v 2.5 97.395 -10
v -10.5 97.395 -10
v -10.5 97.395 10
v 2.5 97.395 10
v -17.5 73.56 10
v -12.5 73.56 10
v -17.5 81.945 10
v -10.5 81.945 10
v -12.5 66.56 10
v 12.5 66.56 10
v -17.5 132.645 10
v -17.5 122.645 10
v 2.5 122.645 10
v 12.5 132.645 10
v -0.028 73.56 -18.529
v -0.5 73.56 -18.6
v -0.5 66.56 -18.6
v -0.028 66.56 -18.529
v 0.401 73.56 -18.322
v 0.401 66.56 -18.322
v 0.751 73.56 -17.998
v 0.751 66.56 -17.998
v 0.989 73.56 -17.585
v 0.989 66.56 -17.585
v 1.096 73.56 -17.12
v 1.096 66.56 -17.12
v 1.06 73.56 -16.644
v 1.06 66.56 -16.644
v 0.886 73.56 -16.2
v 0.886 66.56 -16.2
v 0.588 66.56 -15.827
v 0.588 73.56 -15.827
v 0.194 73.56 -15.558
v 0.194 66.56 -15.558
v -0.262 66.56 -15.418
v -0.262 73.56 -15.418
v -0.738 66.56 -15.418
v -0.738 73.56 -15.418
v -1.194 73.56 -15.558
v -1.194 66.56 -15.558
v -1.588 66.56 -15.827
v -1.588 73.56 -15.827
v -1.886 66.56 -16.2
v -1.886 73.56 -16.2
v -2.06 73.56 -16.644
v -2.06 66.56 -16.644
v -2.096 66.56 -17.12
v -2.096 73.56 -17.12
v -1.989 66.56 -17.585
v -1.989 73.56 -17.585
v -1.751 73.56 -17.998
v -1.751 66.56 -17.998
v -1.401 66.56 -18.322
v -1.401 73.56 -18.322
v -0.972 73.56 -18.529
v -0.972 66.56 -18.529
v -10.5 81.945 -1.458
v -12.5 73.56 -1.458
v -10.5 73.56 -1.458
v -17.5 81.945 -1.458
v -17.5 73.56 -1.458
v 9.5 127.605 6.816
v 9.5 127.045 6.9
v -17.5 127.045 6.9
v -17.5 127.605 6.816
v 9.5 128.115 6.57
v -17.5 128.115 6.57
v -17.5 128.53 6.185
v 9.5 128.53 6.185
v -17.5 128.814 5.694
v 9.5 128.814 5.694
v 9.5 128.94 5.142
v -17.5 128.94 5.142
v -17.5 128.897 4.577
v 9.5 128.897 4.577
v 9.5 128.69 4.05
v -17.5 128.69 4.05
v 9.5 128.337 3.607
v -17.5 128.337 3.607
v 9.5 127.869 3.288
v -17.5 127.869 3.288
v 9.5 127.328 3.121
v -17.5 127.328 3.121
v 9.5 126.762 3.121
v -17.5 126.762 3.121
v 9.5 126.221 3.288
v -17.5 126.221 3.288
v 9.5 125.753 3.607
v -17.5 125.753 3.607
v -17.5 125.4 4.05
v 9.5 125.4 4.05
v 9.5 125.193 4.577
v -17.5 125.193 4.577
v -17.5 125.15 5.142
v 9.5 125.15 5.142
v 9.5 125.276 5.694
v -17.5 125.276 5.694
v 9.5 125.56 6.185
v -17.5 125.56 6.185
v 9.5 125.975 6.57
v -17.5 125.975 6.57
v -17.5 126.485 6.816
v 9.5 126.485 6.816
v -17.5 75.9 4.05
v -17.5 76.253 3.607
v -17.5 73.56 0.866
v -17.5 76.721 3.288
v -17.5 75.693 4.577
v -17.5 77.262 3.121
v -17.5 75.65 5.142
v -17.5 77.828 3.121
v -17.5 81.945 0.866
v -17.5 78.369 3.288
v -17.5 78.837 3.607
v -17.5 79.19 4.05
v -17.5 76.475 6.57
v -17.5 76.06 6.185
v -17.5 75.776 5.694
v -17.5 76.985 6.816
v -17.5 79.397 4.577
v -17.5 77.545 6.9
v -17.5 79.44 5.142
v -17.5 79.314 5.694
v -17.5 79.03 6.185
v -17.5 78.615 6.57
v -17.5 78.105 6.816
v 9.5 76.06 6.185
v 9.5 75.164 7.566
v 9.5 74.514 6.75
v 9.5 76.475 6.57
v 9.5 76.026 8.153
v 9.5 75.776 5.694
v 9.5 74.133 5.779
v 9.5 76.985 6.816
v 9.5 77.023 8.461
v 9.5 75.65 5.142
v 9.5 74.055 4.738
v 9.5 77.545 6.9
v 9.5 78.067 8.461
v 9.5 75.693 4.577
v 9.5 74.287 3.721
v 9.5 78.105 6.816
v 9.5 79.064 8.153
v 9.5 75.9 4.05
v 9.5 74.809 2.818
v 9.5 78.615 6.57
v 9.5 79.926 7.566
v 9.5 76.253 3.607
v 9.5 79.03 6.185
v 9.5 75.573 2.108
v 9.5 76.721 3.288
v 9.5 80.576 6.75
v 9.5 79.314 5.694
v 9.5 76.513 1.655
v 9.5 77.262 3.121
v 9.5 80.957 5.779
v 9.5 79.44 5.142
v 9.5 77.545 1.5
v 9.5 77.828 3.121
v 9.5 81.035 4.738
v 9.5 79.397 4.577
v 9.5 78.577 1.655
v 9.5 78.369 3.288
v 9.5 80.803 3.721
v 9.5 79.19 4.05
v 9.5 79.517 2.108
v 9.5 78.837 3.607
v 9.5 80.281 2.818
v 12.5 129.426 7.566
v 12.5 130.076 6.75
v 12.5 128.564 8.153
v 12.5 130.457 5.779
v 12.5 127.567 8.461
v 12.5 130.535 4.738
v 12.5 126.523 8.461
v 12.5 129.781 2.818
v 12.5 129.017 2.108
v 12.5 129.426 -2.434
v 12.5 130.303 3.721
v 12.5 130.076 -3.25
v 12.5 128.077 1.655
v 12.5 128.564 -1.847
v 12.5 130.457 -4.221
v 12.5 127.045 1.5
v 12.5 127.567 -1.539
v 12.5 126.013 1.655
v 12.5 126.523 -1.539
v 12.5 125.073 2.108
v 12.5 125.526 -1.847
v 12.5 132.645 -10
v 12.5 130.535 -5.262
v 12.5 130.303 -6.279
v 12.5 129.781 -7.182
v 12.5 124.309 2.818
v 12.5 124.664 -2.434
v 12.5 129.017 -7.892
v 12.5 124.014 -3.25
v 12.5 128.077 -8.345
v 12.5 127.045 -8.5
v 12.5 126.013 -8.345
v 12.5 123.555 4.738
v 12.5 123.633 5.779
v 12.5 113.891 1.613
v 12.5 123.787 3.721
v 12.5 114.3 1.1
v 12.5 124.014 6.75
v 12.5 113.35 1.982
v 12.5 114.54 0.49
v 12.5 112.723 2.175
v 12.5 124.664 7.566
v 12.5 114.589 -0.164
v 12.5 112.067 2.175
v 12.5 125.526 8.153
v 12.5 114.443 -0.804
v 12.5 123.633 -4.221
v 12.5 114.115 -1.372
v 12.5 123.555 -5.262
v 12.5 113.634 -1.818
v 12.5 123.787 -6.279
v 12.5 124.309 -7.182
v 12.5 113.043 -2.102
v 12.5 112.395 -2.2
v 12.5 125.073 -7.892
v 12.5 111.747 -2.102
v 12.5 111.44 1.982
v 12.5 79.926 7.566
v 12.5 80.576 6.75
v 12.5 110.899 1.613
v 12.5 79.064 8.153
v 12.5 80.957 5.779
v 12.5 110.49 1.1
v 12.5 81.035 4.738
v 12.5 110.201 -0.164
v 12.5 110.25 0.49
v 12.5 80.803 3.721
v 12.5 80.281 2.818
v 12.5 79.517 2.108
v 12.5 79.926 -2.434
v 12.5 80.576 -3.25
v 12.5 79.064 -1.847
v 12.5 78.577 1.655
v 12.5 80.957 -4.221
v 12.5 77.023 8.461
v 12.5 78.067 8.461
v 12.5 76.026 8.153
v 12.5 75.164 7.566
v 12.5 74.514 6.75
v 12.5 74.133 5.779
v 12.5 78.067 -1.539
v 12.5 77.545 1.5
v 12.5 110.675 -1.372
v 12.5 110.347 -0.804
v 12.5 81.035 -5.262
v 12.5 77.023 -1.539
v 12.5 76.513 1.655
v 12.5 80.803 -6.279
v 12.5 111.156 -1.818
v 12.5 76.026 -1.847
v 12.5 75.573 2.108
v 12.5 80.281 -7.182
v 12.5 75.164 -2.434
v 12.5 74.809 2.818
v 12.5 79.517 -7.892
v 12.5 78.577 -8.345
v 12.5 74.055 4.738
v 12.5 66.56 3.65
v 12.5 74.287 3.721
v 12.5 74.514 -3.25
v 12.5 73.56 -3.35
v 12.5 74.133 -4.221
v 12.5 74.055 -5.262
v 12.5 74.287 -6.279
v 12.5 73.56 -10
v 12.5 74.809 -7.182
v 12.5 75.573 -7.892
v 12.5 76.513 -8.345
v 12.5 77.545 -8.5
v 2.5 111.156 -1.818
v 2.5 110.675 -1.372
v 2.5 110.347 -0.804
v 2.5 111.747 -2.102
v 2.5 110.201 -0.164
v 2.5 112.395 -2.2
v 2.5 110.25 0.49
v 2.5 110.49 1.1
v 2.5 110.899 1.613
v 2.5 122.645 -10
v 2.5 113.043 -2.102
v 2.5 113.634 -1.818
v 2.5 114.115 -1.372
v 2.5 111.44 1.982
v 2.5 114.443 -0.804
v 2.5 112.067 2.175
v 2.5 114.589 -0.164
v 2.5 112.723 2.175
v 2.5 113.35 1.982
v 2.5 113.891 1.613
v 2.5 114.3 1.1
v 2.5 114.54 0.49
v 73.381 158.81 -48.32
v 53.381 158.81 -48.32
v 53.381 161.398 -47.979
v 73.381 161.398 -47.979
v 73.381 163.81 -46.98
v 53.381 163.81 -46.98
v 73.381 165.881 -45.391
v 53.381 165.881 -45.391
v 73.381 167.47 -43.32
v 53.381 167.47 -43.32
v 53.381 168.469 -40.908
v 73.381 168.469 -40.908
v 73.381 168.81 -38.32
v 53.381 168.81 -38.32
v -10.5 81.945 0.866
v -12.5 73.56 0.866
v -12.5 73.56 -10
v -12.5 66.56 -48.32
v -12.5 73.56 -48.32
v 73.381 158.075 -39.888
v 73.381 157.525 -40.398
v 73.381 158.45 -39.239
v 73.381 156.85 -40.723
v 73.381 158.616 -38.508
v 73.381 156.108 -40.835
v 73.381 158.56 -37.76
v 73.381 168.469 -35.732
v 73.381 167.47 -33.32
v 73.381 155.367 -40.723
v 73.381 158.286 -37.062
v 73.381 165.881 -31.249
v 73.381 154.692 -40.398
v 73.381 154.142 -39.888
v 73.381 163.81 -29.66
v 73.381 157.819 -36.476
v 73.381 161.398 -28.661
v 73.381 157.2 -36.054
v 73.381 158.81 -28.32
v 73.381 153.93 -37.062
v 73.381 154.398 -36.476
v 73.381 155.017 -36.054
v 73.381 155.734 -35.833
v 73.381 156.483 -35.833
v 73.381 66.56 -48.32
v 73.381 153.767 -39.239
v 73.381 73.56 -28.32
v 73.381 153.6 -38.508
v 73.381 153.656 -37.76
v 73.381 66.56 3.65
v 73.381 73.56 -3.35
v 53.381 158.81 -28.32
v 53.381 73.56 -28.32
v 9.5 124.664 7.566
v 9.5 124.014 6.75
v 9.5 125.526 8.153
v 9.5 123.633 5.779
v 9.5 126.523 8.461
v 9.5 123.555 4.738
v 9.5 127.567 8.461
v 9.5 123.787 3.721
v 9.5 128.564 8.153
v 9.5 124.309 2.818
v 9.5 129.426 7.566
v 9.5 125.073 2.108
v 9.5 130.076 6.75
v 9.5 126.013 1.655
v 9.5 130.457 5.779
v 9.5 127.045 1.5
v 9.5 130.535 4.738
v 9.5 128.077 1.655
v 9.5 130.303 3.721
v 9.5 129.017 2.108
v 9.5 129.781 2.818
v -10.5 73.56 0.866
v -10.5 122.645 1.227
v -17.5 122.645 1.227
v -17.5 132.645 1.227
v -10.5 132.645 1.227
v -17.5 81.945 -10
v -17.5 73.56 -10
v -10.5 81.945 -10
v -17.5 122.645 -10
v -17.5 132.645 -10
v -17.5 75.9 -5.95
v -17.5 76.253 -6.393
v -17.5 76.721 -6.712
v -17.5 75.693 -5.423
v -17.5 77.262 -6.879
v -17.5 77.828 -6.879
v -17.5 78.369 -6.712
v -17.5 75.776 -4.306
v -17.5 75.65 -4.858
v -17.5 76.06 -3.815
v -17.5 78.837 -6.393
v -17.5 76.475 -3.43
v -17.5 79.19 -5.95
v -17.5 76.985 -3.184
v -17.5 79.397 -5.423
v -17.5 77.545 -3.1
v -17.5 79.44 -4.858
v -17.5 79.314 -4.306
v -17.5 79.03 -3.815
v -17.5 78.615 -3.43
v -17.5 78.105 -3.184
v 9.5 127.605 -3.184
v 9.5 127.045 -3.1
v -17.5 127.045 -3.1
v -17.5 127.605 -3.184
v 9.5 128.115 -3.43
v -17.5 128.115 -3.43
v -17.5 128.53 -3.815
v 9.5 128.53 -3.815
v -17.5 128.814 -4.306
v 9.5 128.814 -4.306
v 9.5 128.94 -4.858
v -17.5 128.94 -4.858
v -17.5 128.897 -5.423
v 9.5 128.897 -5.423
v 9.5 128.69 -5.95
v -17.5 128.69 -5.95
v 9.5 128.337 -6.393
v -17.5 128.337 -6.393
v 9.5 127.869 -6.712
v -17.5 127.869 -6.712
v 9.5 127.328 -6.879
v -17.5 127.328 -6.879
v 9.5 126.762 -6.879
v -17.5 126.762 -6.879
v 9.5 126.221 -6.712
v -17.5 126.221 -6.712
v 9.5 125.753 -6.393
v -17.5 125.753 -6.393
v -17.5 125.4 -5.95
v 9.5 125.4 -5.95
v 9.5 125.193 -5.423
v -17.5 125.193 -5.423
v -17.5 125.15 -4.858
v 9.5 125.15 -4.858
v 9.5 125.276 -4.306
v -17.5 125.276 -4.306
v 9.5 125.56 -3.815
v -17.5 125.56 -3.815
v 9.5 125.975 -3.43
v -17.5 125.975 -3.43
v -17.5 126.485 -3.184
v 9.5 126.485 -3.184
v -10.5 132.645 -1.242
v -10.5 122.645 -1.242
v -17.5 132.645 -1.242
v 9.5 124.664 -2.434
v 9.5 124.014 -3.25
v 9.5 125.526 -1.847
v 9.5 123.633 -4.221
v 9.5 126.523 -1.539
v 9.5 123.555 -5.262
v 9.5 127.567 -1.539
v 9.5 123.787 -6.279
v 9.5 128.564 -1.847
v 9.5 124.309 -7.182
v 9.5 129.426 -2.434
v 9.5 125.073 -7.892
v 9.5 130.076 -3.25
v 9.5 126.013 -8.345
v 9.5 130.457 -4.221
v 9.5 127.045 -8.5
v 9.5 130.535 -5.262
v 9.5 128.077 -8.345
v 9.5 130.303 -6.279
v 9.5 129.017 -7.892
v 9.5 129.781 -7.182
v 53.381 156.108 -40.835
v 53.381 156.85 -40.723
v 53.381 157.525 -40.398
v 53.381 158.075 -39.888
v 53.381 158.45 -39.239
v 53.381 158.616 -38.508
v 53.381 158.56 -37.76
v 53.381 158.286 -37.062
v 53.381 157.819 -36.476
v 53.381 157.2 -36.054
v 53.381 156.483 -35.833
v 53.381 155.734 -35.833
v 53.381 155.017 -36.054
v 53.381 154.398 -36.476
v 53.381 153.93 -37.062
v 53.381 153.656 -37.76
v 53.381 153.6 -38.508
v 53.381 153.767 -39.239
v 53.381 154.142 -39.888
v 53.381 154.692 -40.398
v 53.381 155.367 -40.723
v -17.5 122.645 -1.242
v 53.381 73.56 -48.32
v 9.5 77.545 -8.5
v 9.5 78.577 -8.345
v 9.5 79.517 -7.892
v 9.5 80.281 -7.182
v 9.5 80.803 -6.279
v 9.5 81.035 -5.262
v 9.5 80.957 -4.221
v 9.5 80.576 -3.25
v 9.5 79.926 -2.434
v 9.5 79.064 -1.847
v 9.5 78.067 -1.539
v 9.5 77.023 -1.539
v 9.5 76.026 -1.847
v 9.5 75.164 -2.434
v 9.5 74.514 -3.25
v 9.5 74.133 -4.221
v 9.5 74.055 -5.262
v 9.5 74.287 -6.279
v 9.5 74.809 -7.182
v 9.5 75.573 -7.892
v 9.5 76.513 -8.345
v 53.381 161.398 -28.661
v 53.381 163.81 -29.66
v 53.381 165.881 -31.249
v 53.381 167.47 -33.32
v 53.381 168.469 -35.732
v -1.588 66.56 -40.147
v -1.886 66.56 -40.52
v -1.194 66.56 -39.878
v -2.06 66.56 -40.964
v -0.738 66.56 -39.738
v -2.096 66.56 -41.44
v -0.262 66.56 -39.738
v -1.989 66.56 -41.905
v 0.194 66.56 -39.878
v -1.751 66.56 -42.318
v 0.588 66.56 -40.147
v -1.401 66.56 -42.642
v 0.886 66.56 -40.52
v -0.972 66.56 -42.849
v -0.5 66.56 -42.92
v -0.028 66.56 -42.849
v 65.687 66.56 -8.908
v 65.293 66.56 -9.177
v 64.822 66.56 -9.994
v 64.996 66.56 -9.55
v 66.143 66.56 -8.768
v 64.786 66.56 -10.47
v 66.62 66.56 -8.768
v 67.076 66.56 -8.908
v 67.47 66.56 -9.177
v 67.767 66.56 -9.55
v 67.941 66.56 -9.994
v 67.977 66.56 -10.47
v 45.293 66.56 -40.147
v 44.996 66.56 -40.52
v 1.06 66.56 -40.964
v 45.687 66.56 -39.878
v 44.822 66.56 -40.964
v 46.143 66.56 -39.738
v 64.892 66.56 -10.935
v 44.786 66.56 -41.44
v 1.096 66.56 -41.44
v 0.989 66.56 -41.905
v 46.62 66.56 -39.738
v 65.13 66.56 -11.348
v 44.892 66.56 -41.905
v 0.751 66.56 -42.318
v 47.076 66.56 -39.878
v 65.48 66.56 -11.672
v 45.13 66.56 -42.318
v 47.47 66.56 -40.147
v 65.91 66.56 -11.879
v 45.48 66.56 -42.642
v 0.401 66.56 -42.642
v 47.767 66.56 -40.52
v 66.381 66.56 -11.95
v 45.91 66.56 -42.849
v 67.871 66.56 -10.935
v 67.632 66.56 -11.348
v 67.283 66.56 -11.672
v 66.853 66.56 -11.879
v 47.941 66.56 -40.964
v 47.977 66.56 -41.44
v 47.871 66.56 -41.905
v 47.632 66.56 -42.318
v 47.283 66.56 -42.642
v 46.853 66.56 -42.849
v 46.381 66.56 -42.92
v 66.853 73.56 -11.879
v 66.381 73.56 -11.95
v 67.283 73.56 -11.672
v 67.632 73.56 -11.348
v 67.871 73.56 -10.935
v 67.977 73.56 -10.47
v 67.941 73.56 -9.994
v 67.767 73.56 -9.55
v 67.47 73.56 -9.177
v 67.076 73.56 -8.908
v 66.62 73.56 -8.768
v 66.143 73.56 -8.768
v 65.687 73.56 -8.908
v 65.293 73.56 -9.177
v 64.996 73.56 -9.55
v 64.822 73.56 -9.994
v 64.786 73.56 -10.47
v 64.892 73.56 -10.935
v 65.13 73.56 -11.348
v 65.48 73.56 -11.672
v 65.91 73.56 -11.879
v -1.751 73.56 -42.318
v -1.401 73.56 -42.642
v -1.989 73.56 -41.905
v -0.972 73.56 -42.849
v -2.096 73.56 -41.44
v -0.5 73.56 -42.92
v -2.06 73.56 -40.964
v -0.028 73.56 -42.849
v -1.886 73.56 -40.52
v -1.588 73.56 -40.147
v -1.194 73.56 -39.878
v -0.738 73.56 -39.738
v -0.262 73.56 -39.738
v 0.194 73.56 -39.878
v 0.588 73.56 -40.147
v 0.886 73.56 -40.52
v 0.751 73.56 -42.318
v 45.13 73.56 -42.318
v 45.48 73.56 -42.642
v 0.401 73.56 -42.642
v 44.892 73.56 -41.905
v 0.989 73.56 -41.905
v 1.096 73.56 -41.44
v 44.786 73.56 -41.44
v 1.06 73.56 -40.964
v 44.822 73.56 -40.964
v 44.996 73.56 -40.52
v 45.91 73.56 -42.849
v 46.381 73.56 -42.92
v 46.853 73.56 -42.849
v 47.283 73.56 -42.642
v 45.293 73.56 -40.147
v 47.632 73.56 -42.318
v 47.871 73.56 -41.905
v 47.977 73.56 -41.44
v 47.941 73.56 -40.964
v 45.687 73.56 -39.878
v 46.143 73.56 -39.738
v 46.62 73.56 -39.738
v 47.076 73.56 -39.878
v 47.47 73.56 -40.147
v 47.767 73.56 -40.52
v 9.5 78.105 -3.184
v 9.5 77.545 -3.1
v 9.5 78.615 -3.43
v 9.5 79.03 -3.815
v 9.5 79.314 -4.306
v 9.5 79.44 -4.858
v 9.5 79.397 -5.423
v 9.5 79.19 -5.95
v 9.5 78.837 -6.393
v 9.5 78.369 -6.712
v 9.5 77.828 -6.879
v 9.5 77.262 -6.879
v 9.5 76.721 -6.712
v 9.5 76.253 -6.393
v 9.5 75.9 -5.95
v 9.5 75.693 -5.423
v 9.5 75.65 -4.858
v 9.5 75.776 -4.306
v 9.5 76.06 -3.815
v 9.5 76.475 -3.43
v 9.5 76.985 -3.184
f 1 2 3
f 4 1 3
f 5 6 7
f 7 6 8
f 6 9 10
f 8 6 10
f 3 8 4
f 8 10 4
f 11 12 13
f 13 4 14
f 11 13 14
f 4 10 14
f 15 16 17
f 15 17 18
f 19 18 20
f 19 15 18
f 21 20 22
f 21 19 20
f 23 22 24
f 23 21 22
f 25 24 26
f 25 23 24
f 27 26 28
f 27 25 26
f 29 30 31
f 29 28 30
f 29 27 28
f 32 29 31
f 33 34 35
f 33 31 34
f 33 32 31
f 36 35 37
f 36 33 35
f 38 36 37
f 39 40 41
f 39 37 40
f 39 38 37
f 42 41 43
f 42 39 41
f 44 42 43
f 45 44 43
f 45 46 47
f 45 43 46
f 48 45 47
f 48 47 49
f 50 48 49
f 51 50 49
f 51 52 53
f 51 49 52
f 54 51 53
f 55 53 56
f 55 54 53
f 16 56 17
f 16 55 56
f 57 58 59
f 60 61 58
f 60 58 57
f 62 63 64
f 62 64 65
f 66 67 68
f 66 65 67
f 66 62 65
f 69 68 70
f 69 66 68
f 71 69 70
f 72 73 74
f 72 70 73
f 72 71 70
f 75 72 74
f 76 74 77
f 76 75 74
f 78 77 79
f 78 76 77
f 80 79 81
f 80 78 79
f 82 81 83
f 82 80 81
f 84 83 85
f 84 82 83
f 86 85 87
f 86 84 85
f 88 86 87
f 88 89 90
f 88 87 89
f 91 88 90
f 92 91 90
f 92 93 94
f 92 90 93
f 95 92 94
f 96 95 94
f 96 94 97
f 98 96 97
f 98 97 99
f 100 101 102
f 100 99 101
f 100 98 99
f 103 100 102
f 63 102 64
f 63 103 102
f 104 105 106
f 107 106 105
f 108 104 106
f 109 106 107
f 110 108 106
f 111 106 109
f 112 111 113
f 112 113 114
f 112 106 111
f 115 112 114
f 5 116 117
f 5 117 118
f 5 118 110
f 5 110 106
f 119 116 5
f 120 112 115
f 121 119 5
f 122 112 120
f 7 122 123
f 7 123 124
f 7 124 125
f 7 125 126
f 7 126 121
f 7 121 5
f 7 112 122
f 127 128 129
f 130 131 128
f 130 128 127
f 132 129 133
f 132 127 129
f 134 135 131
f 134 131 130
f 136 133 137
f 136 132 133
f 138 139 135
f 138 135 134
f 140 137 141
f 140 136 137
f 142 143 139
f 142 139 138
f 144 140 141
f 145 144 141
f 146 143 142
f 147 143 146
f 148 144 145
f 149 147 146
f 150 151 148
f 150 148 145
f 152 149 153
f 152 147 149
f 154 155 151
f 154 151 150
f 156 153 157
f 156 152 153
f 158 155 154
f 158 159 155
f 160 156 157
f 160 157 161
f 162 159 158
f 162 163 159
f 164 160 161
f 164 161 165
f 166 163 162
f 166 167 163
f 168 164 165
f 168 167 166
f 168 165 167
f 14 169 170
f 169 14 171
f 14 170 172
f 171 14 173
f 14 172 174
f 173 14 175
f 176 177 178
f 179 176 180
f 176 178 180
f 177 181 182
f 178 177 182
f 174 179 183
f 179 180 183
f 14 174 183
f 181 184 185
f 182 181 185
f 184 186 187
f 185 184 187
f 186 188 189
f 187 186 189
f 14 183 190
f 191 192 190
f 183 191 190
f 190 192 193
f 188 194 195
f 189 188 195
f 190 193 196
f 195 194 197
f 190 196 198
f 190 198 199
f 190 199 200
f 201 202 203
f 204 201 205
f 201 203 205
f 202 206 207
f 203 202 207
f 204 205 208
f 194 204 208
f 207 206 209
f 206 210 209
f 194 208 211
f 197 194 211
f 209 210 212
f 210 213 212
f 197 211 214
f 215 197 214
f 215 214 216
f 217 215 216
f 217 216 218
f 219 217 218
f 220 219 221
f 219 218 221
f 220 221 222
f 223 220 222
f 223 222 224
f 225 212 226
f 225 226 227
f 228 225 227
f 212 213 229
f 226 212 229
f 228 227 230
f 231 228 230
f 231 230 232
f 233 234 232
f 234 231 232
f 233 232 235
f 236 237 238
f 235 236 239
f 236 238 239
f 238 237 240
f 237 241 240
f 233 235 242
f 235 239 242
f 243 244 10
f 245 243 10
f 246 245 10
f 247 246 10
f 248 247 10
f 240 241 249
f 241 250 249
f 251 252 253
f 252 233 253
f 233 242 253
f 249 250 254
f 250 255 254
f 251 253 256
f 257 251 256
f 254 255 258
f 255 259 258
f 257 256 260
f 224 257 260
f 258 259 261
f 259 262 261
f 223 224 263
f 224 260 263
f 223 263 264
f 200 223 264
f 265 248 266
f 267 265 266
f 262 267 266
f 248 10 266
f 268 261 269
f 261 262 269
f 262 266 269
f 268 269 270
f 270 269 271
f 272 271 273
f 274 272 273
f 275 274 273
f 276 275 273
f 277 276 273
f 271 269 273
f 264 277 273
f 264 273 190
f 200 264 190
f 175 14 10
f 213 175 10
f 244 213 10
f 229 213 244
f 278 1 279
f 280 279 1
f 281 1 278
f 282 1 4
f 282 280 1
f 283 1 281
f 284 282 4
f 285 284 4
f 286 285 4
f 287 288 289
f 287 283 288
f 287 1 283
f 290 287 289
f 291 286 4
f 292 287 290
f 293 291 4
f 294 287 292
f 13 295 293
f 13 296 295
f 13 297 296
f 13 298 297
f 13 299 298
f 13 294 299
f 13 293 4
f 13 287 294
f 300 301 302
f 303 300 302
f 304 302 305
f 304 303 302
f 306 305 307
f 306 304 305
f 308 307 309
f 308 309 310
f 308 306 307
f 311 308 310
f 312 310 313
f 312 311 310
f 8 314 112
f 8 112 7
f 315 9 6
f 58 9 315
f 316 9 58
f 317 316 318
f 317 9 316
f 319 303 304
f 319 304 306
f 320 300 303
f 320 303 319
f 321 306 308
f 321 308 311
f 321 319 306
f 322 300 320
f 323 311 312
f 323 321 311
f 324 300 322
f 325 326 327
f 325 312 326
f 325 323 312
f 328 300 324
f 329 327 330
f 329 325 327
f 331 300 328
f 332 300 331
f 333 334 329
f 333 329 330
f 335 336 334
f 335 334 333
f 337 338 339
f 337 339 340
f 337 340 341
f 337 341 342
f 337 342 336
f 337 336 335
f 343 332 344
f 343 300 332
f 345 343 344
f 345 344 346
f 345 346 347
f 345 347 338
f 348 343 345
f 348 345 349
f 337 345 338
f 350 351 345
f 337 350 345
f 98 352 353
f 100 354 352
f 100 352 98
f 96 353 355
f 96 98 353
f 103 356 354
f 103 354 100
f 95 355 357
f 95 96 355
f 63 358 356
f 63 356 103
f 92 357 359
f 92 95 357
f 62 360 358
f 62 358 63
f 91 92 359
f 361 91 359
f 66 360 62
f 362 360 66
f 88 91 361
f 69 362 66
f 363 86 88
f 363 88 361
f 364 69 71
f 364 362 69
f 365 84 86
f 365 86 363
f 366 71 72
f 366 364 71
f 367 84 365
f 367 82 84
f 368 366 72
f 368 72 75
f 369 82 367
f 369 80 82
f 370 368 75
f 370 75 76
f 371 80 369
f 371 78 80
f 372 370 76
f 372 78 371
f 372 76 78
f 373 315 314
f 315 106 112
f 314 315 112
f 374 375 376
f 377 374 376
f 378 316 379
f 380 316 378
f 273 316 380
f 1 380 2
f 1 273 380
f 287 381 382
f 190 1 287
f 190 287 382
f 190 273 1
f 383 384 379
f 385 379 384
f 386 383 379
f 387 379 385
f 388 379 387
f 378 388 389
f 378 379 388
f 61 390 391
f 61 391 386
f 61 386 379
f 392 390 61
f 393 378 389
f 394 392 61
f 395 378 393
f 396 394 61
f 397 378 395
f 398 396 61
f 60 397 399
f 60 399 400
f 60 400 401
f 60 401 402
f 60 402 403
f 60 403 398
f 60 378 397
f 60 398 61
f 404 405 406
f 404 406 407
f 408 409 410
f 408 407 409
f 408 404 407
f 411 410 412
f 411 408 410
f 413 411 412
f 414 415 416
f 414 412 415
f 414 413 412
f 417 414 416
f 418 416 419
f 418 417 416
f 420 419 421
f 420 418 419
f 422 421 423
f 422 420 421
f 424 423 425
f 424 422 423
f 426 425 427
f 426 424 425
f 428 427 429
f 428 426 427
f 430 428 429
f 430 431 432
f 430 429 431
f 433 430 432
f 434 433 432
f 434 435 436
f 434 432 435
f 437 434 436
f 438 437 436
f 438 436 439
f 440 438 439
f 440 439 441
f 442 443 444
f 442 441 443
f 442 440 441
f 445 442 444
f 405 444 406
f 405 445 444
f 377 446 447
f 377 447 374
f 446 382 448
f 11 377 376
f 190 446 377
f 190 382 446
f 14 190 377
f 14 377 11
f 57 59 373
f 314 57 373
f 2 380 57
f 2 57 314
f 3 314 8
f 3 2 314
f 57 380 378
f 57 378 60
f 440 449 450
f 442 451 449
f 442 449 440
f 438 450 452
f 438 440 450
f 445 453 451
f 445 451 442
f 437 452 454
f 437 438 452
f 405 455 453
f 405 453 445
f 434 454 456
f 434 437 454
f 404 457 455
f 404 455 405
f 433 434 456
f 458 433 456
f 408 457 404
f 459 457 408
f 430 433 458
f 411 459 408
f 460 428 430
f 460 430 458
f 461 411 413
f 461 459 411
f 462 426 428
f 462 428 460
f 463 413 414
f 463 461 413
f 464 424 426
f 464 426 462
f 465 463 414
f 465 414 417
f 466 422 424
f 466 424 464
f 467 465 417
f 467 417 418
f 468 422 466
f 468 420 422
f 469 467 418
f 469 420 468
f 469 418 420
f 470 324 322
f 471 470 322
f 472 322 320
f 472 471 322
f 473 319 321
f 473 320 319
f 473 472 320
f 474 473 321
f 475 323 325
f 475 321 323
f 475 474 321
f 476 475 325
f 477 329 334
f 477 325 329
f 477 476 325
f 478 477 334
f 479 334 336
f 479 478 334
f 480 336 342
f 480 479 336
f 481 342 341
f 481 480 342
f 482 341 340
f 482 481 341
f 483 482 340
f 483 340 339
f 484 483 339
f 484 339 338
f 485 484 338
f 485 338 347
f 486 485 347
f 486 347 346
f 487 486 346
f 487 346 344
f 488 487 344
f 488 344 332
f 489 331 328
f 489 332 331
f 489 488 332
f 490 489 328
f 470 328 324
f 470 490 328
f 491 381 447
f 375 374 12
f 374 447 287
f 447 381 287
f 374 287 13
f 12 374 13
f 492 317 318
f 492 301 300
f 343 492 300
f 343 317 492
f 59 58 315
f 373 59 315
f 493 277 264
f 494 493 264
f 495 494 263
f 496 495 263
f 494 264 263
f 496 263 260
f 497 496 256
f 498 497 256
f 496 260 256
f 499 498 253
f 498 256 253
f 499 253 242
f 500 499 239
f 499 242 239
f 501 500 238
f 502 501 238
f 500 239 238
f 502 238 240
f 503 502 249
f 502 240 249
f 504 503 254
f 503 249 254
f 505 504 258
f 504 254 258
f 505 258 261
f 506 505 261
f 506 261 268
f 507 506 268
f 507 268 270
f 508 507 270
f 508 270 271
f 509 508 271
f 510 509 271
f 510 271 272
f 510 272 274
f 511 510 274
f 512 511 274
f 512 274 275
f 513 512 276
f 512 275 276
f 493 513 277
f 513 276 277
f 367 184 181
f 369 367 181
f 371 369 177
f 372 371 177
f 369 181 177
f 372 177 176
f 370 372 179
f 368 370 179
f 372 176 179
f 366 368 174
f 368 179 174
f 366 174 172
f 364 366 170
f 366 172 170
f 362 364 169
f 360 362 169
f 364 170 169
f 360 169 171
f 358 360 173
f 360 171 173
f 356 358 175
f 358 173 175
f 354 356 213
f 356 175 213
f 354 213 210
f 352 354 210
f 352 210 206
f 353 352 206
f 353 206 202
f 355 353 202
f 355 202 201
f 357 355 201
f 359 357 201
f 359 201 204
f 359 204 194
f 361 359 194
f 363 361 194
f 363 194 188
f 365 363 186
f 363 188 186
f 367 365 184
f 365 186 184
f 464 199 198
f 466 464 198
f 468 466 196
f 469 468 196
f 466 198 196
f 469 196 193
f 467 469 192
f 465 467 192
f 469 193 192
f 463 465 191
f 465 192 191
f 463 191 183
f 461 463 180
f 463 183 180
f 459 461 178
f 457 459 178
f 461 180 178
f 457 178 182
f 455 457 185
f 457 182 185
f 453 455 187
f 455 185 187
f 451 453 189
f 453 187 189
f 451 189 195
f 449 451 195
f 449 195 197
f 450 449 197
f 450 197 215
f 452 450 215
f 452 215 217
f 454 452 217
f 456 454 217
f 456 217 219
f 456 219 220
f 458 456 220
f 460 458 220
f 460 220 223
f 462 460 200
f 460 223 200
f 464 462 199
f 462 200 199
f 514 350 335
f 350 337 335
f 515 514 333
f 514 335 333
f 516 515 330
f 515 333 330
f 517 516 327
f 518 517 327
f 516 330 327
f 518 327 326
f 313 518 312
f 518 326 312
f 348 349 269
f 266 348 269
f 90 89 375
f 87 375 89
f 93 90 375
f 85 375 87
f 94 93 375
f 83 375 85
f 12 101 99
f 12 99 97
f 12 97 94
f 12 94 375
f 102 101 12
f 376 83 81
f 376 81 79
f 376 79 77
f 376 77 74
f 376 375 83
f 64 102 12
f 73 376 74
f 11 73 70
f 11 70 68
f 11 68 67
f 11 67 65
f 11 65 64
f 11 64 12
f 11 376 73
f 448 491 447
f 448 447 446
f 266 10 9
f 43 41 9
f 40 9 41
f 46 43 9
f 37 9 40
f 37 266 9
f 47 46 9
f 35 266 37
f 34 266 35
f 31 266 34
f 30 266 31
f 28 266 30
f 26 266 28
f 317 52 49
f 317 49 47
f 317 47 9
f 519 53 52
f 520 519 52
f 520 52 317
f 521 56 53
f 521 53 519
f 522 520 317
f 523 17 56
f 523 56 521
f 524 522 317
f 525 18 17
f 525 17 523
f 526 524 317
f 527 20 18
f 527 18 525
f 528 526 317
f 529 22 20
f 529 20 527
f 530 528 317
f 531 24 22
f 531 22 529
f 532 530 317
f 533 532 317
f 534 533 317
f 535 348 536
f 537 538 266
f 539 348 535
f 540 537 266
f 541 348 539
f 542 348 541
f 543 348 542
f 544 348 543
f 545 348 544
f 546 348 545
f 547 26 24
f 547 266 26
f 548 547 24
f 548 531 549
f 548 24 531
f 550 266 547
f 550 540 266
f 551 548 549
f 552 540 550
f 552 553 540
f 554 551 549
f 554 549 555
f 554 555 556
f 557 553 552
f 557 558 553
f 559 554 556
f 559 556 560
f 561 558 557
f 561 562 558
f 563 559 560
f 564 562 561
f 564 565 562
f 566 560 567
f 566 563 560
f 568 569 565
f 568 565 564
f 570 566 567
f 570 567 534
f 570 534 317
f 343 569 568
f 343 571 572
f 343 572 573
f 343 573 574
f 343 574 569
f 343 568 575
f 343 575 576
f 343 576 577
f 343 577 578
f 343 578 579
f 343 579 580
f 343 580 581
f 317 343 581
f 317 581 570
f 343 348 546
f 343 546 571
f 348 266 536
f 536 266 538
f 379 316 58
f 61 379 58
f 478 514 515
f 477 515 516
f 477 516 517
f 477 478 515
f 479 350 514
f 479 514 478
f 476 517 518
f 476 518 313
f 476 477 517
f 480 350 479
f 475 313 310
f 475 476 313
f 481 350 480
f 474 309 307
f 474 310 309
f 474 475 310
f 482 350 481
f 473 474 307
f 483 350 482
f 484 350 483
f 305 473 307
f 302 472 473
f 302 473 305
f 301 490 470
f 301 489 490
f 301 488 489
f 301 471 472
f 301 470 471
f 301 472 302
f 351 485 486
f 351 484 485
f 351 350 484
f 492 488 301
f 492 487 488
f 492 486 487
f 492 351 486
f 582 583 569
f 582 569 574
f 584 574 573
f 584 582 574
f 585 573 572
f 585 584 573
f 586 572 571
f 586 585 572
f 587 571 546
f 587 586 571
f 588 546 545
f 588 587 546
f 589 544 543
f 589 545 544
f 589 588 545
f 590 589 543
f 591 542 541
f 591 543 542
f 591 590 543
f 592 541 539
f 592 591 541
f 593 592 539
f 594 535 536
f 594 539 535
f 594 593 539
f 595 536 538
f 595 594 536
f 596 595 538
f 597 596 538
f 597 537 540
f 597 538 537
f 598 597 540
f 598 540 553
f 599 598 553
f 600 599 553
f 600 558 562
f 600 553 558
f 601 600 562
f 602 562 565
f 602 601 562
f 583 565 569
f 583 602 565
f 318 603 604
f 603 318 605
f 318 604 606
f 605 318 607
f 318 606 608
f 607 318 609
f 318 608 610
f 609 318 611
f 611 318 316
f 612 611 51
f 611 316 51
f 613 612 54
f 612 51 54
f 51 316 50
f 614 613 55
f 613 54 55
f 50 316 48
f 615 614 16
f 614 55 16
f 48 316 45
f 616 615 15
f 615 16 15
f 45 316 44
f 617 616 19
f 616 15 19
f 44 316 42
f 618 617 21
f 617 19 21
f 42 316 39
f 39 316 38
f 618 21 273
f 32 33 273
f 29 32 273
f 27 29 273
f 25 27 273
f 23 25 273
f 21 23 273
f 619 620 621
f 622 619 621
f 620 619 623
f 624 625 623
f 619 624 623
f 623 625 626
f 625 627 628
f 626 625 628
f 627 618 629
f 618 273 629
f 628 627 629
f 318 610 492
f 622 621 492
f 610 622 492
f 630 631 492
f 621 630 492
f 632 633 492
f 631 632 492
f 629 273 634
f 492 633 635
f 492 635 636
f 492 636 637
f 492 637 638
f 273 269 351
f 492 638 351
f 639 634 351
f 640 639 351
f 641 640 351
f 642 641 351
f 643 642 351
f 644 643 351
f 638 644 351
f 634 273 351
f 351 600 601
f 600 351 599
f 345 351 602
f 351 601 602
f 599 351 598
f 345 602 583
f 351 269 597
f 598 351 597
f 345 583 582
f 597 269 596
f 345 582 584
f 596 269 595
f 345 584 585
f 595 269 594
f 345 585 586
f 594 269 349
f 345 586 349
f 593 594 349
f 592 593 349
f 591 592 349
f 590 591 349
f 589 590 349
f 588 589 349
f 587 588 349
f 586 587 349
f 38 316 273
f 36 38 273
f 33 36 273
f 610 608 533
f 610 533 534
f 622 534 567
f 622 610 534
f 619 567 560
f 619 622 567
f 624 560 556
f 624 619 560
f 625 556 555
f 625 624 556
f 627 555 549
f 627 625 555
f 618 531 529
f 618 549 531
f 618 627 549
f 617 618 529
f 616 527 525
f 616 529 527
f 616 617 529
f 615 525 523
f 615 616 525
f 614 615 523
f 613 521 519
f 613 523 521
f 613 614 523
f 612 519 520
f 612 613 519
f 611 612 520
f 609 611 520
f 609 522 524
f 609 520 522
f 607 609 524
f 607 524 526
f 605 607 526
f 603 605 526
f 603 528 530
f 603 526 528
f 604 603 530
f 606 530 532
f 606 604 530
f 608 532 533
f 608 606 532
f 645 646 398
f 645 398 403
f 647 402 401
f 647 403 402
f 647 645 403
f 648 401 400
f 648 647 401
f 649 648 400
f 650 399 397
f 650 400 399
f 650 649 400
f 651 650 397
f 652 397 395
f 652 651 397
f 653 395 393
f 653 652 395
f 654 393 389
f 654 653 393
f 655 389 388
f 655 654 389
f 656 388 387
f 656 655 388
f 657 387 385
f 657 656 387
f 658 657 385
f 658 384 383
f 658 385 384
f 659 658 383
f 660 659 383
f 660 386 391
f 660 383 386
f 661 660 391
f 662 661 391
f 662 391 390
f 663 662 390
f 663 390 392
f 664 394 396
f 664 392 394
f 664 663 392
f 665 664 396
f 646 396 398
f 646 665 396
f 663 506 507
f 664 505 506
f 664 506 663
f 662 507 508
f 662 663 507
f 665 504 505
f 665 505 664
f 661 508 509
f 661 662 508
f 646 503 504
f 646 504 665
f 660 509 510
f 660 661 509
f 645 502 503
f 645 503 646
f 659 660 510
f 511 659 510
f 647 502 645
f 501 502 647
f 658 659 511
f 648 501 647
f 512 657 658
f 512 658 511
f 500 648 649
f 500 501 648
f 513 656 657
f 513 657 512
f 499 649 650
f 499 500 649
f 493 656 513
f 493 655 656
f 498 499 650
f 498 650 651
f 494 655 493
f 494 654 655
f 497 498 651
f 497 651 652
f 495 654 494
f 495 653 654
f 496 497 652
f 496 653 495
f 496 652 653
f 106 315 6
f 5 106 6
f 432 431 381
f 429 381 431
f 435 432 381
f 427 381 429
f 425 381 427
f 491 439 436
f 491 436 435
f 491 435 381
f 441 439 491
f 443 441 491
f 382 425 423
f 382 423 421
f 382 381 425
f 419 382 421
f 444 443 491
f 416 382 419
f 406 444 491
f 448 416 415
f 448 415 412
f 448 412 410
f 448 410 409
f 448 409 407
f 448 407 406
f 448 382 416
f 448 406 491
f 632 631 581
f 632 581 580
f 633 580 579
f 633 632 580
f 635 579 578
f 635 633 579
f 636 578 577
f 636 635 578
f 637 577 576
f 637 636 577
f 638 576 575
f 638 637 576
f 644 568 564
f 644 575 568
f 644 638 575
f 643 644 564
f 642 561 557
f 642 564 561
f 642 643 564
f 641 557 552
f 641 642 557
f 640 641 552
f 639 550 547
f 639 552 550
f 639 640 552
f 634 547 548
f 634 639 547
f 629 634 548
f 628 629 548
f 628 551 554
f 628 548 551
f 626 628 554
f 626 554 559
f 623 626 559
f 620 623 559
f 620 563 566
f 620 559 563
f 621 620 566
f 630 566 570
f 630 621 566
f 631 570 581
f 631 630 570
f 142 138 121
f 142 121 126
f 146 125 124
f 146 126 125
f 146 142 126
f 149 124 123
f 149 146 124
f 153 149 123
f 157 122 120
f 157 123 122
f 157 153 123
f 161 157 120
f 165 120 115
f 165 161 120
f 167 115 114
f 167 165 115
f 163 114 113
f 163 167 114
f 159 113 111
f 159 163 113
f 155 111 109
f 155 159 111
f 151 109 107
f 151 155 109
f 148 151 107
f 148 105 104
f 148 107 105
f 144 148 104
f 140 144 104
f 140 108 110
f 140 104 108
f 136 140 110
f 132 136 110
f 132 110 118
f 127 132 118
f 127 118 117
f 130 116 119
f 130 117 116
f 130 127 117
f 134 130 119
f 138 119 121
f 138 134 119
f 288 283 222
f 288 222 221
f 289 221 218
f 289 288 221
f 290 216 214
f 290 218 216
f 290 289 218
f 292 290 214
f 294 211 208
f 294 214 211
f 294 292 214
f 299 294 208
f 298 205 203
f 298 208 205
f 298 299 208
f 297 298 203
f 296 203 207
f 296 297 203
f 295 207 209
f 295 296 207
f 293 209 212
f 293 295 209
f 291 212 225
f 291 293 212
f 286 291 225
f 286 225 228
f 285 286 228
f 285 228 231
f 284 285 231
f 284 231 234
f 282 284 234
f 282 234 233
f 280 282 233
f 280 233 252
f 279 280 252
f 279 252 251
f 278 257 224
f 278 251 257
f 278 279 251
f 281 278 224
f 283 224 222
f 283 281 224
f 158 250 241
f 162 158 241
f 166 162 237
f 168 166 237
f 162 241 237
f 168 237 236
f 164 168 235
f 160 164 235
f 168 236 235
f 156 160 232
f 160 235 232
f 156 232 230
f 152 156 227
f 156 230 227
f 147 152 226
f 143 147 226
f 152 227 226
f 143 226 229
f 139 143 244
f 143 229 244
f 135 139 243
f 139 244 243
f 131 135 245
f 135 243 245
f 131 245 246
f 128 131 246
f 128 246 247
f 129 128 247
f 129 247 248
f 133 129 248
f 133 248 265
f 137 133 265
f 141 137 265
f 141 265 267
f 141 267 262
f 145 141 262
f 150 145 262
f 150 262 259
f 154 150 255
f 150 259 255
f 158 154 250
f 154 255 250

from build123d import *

# Parameters (mm, degrees)
SKETCH1_W                = 25
SKETCH1_H                = 20
BOSS_EXTRUDE1_DEPTH      = 168.81
SKETCH1_W_2              = 20
BOSS_EXTRUDE1_2_DEPTH    = 168.81
CUT_EXTRUDE1_DEPTH       = 194.087721945
CUT_EXTRUDE1_DEPTH_BACK  = 194.087721945
SKETCH2_W                = 25
SKETCH2_H                = 44.708
FILLET2_R                = 10
CUT_EXTRUDE2_DEPTH       = 196.466757701
CUT_EXTRUDE2_DEPTH_BACK  = 196.466757701
SKETCH4_R                = 2.515
CUT_EXTRUDE3_DEPTH       = 186.844513952
CUT_EXTRUDE3_DEPTH_BACK  = 186.844513952
SKETCH3_R                = 2.2
SKETCH5_W                = 58.32
SKETCH5_H                = 66.56
CUT_EXTRUDE4_DEPTH       = 84.405
BOSS_EXTRUDE2_DEPTH      = 7
CHAMFER1_SIZE            = 7
SKETCH8_W                = 20
SKETCH8_H                = 13.858822584
SKETCH8_H_2              = 30.45
CUT_EXTRUDE6_DEPTH       = 2
SKETCH9_W                = 20
SKETCH9_H                = 31.847227872
CUT_EXTRUDE7_DEPTH       = 13
BOSS_EXTRUDE3_START      = -10
SKETCH10_W               = 20
SKETCH10_H               = 10
BOSS_EXTRUDE3_DEPTH      = 30
SKETCH11_W               = 20
SKETCH11_H               = 8.385
BOSS_EXTRUDE4_DEPTH      = 5
CUT_EXTRUDE8_DEPTH       = 135.813629748
CUT_EXTRUDE8_DEPTH_BACK  = 135.813629748
SKETCH12_R               = 1.6
CUT_EXTRUDE11_DEPTH      = 198.714610907
CUT_EXTRUDE11_DEPTH_BACK = 198.714610907
SKETCH13_R               = 1.9
SKETCH14_R               = 3.5
CUT_EXTRUDE12_DEPTH      = 3
CUT_EXTRUDE13_REACH      = 199.715
SKETCH16_W               = 2.468990405
SKETCH16_H               = 10
SKETCH16_W_2             = 2.323465518
SKETCH16_H_2             = 8.385


with BuildPart() as part:
    # Sketch1 → Boss-Extrude1 (new body)
    with BuildSketch(Plane(origin=(0, 0, 0), x_dir=(1, 0, 0), z_dir=(0, 1, 0))):
        Rectangle(SKETCH1_W, SKETCH1_H)
    extrude(amount=BOSS_EXTRUDE1_DEPTH)

    # Sketch2 → Cut-Extrude1 (cut, two sides: drawn at the far end of the back side and taken through both)
    with BuildSketch(Plane.XY.offset(10).offset(-CUT_EXTRUDE1_DEPTH_BACK)):
        with Locations((0, 146.456)):
            Rectangle(SKETCH2_W, SKETCH2_H)
    extrude(amount=CUT_EXTRUDE1_DEPTH + CUT_EXTRUDE1_DEPTH_BACK, mode=Mode.SUBTRACT)

    # Sketch3 → Cut-Extrude3 (cut, two sides: drawn at the far end of the back side and taken through both)
    with BuildSketch(Plane(origin=(12.5, 0, 0), x_dir=(0, 0, -1), z_dir=(1, 0, 0)).offset(-CUT_EXTRUDE3_DEPTH_BACK)):
        with Locations((0, 112.395)):
            Circle(SKETCH3_R)
    extrude(amount=CUT_EXTRUDE3_DEPTH + CUT_EXTRUDE3_DEPTH_BACK, mode=Mode.SUBTRACT)


with BuildPart() as body_2:
    # Sketch1 → Boss-Extrude1 2 (new body)
    with BuildSketch(Plane(origin=(0, 0, 0), x_dir=(1, 0, 0), z_dir=(0, 1, 0))):
        with Locations((63.3814, 38.32)):
            Rectangle(SKETCH1_W_2, SKETCH1_H)
    extrude(amount=BOSS_EXTRUDE1_2_DEPTH)

    # Fillet2
    fillet2_edges = [body_2.edges().sort_by_distance(p)[0] for p in [
        (63.3814, 168.81, -48.32),
        (63.3814, 168.81, -28.32),
    ]]
    fillet(fillet2_edges, radius=FILLET2_R - 0.0001)  # a hair under: the kernel refuses the full size

    # Sketch4 → Cut-Extrude2 (cut, two sides: drawn at the far end of the back side and taken through both)
    with BuildSketch(Plane(origin=(73.3814, 0, 0), x_dir=(0, 0, -1), z_dir=(1, 0, 0)).offset(-CUT_EXTRUDE2_DEPTH_BACK)):
        with Locations((38.32, 156.1084)):
            Circle(SKETCH4_R)
    extrude(amount=CUT_EXTRUDE2_DEPTH + CUT_EXTRUDE2_DEPTH_BACK, mode=Mode.SUBTRACT)


with BuildPart() as cut_extrude4_tool:
    # Sketch5 → Cut-Extrude4 (new, symmetric)
    with BuildSketch(Plane(origin=(12.5, 0, 0), x_dir=(0, 0, -1), z_dir=(1, 0, 0))):
        with Locations((19.16, 33.28)):
            Rectangle(SKETCH5_W, SKETCH5_H)
    extrude(amount=CUT_EXTRUDE4_DEPTH, both=True)


with BuildPart() as part_1:
    add(part.part)

    # Cut-Extrude4: cut by cut_extrude4_tool
    add(cut_extrude4_tool.part, mode=Mode.SUBTRACT)



with BuildPart() as body_2_1:
    add(body_2.part)

    # Cut-Extrude4: cut by cut_extrude4_tool
    add(cut_extrude4_tool.part, mode=Mode.SUBTRACT)


with BuildPart() as part_2:
    add(part_1.part)

    add(body_2_1.part)  # Boss-Extrude2 merges body 2
    # Sketch6 → Boss-Extrude2 (add)
    with BuildSketch(Plane.XZ.offset(-66.56)):
        Polygon((12.5, 10), (-12.5, 10), (-12.5, -48.32), (53.3814, -48.32), (53.3814, -28.32), (73.3814, -28.32), (73.3814, 3.65), (12.5, 3.65), align=None)
    extrude(amount=-BOSS_EXTRUDE2_DEPTH)

    # Chamfer1
    chamfer1_edges = [part_2.edges().sort_by_distance(p)[0] for p in [
        (42.9407, 73.56, 3.65),
    ]]
    chamfer(chamfer1_edges, length=CHAMFER1_SIZE - 0.0001)  # a hair under: the kernel refuses the full size

    # Sketch8 → Cut-Extrude6 (cut)
    with BuildSketch(Plane.ZY.offset(12.5)):
        with Locations((0, 119.324411292)):
            Rectangle(SKETCH8_W, SKETCH8_H)
        with Locations((0, 97.17)):
            Rectangle(SKETCH8_W, SKETCH8_H_2)
    extrude(amount=-CUT_EXTRUDE6_DEPTH, mode=Mode.SUBTRACT)

    # Sketch9 → Cut-Extrude7 (cut)
    with BuildSketch(Plane.ZY.offset(10.5)):
        with Locations((0, 113.318613936)):
            Rectangle(SKETCH9_W, SKETCH9_H)
    extrude(amount=-CUT_EXTRUDE7_DEPTH, mode=Mode.SUBTRACT)

    # Sketch10 → Boss-Extrude3 (add)
    with BuildSketch(Plane.ZY.offset(-2.5).offset(BOSS_EXTRUDE3_START)):
        with Locations((0, 127.645)):
            Rectangle(SKETCH10_W, SKETCH10_H)
    extrude(amount=BOSS_EXTRUDE3_DEPTH)

    # Sketch11 → Boss-Extrude4 (add)
    with BuildSketch(Plane.ZY.offset(12.5)):
        with Locations((0, 77.7525)):
            Rectangle(SKETCH11_W, SKETCH11_H)
    extrude(amount=BOSS_EXTRUDE4_DEPTH)

    # Sketch12 → Cut-Extrude8 (cut, two sides: drawn at the far end of the back side and taken through both)
    with BuildSketch(Plane.XZ.offset(-66.56).offset(-CUT_EXTRUDE8_DEPTH_BACK)):
        with Locations(Location((-0.5, -17, 0), (0, 0, 270))):
            Circle(SKETCH12_R)
        with Locations(Location((46.3814, -41.32, 0), (0, 0, 270))):
            Circle(SKETCH12_R)
        with Locations(Location((66.3814, -10.35, 0), (0, 0, 270))):
            Circle(SKETCH12_R)
        with Locations(Location((-0.5, -41.32, 0), (0, 0, 270))):
            Circle(SKETCH12_R)
    extrude(amount=CUT_EXTRUDE8_DEPTH + CUT_EXTRUDE8_DEPTH_BACK, mode=Mode.SUBTRACT)

    # Sketch13 → Cut-Extrude11 (cut, two sides: drawn at the far end of the back side and taken through both)
    with BuildSketch(Plane.ZY.offset(17.5).offset(-CUT_EXTRUDE11_DEPTH_BACK)):
        with Locations((-5, 127.045)):
            Circle(SKETCH13_R)
        with Locations((5, 127.045)):
            Circle(SKETCH13_R)
        with Locations((5, 77.545)):
            Circle(SKETCH13_R)
        with Locations((-5, 77.545)):
            Circle(SKETCH13_R)
    extrude(amount=CUT_EXTRUDE11_DEPTH + CUT_EXTRUDE11_DEPTH_BACK, mode=Mode.SUBTRACT)

    # Sketch14 → Cut-Extrude12 (cut)
    with BuildSketch(Plane(origin=(12.5, 0, 0), x_dir=(0, 0, -1), z_dir=(1, 0, 0))):
        with Locations((5, 127.045)):
            Circle(SKETCH14_R)
        with Locations((-5, 127.045)):
            Circle(SKETCH14_R)
        with Locations((-5, 77.545)):
            Circle(SKETCH14_R)
        with Locations((5, 77.545)):
            Circle(SKETCH14_R)
    extrude(amount=-CUT_EXTRUDE12_DEPTH, mode=Mode.SUBTRACT)

    # Cut-Extrude13: up to this face of the body (flat: up to its plane)
    cut_extrude13_end = Plane(part_2.part.faces().sort_by_distance((-10.5, 89.67, 0))[0])
    # Sketch16 → Cut-Extrude13 (cut, up to the picked face)
    with BuildSketch(Plane.ZY.offset(17.5), mode=Mode.PRIVATE) as cut_extrude13_sk1:
        with Locations((-0.007149366, 127.645)):
            Rectangle(SKETCH16_W, SKETCH16_H)
    cut_extrude13_tool1 = split(extrude(cut_extrude13_sk1.sketch, amount=-CUT_EXTRUDE13_REACH, mode=Mode.PRIVATE), bisect_by=cut_extrude13_end, keep=Keep.BOTH, mode=Mode.PRIVATE)
    # Sketch16 → Cut-Extrude13 (cut, up to the picked face)
    with BuildSketch(Plane.ZY.offset(17.5), mode=Mode.PRIVATE) as cut_extrude13_sk2:
        with Locations((-0.29586588, 77.7525)):
            Rectangle(SKETCH16_W_2, SKETCH16_H_2)
    cut_extrude13_tool2 = split(extrude(cut_extrude13_sk2.sketch, amount=-CUT_EXTRUDE13_REACH, mode=Mode.PRIVATE), bisect_by=cut_extrude13_end, keep=Keep.BOTH, mode=Mode.PRIVATE)
    add(cut_extrude13_tool1.solids().sort_by(Axis((-17.5, 127.645, -0.007149), (1, 0, 0)))[0], mode=Mode.SUBTRACT)
    add(cut_extrude13_tool2.solids().sort_by(Axis((-17.5, 77.7525, -0.295866), (1, 0, 0)))[0], mode=Mode.SUBTRACT)


solid = part_2.part
